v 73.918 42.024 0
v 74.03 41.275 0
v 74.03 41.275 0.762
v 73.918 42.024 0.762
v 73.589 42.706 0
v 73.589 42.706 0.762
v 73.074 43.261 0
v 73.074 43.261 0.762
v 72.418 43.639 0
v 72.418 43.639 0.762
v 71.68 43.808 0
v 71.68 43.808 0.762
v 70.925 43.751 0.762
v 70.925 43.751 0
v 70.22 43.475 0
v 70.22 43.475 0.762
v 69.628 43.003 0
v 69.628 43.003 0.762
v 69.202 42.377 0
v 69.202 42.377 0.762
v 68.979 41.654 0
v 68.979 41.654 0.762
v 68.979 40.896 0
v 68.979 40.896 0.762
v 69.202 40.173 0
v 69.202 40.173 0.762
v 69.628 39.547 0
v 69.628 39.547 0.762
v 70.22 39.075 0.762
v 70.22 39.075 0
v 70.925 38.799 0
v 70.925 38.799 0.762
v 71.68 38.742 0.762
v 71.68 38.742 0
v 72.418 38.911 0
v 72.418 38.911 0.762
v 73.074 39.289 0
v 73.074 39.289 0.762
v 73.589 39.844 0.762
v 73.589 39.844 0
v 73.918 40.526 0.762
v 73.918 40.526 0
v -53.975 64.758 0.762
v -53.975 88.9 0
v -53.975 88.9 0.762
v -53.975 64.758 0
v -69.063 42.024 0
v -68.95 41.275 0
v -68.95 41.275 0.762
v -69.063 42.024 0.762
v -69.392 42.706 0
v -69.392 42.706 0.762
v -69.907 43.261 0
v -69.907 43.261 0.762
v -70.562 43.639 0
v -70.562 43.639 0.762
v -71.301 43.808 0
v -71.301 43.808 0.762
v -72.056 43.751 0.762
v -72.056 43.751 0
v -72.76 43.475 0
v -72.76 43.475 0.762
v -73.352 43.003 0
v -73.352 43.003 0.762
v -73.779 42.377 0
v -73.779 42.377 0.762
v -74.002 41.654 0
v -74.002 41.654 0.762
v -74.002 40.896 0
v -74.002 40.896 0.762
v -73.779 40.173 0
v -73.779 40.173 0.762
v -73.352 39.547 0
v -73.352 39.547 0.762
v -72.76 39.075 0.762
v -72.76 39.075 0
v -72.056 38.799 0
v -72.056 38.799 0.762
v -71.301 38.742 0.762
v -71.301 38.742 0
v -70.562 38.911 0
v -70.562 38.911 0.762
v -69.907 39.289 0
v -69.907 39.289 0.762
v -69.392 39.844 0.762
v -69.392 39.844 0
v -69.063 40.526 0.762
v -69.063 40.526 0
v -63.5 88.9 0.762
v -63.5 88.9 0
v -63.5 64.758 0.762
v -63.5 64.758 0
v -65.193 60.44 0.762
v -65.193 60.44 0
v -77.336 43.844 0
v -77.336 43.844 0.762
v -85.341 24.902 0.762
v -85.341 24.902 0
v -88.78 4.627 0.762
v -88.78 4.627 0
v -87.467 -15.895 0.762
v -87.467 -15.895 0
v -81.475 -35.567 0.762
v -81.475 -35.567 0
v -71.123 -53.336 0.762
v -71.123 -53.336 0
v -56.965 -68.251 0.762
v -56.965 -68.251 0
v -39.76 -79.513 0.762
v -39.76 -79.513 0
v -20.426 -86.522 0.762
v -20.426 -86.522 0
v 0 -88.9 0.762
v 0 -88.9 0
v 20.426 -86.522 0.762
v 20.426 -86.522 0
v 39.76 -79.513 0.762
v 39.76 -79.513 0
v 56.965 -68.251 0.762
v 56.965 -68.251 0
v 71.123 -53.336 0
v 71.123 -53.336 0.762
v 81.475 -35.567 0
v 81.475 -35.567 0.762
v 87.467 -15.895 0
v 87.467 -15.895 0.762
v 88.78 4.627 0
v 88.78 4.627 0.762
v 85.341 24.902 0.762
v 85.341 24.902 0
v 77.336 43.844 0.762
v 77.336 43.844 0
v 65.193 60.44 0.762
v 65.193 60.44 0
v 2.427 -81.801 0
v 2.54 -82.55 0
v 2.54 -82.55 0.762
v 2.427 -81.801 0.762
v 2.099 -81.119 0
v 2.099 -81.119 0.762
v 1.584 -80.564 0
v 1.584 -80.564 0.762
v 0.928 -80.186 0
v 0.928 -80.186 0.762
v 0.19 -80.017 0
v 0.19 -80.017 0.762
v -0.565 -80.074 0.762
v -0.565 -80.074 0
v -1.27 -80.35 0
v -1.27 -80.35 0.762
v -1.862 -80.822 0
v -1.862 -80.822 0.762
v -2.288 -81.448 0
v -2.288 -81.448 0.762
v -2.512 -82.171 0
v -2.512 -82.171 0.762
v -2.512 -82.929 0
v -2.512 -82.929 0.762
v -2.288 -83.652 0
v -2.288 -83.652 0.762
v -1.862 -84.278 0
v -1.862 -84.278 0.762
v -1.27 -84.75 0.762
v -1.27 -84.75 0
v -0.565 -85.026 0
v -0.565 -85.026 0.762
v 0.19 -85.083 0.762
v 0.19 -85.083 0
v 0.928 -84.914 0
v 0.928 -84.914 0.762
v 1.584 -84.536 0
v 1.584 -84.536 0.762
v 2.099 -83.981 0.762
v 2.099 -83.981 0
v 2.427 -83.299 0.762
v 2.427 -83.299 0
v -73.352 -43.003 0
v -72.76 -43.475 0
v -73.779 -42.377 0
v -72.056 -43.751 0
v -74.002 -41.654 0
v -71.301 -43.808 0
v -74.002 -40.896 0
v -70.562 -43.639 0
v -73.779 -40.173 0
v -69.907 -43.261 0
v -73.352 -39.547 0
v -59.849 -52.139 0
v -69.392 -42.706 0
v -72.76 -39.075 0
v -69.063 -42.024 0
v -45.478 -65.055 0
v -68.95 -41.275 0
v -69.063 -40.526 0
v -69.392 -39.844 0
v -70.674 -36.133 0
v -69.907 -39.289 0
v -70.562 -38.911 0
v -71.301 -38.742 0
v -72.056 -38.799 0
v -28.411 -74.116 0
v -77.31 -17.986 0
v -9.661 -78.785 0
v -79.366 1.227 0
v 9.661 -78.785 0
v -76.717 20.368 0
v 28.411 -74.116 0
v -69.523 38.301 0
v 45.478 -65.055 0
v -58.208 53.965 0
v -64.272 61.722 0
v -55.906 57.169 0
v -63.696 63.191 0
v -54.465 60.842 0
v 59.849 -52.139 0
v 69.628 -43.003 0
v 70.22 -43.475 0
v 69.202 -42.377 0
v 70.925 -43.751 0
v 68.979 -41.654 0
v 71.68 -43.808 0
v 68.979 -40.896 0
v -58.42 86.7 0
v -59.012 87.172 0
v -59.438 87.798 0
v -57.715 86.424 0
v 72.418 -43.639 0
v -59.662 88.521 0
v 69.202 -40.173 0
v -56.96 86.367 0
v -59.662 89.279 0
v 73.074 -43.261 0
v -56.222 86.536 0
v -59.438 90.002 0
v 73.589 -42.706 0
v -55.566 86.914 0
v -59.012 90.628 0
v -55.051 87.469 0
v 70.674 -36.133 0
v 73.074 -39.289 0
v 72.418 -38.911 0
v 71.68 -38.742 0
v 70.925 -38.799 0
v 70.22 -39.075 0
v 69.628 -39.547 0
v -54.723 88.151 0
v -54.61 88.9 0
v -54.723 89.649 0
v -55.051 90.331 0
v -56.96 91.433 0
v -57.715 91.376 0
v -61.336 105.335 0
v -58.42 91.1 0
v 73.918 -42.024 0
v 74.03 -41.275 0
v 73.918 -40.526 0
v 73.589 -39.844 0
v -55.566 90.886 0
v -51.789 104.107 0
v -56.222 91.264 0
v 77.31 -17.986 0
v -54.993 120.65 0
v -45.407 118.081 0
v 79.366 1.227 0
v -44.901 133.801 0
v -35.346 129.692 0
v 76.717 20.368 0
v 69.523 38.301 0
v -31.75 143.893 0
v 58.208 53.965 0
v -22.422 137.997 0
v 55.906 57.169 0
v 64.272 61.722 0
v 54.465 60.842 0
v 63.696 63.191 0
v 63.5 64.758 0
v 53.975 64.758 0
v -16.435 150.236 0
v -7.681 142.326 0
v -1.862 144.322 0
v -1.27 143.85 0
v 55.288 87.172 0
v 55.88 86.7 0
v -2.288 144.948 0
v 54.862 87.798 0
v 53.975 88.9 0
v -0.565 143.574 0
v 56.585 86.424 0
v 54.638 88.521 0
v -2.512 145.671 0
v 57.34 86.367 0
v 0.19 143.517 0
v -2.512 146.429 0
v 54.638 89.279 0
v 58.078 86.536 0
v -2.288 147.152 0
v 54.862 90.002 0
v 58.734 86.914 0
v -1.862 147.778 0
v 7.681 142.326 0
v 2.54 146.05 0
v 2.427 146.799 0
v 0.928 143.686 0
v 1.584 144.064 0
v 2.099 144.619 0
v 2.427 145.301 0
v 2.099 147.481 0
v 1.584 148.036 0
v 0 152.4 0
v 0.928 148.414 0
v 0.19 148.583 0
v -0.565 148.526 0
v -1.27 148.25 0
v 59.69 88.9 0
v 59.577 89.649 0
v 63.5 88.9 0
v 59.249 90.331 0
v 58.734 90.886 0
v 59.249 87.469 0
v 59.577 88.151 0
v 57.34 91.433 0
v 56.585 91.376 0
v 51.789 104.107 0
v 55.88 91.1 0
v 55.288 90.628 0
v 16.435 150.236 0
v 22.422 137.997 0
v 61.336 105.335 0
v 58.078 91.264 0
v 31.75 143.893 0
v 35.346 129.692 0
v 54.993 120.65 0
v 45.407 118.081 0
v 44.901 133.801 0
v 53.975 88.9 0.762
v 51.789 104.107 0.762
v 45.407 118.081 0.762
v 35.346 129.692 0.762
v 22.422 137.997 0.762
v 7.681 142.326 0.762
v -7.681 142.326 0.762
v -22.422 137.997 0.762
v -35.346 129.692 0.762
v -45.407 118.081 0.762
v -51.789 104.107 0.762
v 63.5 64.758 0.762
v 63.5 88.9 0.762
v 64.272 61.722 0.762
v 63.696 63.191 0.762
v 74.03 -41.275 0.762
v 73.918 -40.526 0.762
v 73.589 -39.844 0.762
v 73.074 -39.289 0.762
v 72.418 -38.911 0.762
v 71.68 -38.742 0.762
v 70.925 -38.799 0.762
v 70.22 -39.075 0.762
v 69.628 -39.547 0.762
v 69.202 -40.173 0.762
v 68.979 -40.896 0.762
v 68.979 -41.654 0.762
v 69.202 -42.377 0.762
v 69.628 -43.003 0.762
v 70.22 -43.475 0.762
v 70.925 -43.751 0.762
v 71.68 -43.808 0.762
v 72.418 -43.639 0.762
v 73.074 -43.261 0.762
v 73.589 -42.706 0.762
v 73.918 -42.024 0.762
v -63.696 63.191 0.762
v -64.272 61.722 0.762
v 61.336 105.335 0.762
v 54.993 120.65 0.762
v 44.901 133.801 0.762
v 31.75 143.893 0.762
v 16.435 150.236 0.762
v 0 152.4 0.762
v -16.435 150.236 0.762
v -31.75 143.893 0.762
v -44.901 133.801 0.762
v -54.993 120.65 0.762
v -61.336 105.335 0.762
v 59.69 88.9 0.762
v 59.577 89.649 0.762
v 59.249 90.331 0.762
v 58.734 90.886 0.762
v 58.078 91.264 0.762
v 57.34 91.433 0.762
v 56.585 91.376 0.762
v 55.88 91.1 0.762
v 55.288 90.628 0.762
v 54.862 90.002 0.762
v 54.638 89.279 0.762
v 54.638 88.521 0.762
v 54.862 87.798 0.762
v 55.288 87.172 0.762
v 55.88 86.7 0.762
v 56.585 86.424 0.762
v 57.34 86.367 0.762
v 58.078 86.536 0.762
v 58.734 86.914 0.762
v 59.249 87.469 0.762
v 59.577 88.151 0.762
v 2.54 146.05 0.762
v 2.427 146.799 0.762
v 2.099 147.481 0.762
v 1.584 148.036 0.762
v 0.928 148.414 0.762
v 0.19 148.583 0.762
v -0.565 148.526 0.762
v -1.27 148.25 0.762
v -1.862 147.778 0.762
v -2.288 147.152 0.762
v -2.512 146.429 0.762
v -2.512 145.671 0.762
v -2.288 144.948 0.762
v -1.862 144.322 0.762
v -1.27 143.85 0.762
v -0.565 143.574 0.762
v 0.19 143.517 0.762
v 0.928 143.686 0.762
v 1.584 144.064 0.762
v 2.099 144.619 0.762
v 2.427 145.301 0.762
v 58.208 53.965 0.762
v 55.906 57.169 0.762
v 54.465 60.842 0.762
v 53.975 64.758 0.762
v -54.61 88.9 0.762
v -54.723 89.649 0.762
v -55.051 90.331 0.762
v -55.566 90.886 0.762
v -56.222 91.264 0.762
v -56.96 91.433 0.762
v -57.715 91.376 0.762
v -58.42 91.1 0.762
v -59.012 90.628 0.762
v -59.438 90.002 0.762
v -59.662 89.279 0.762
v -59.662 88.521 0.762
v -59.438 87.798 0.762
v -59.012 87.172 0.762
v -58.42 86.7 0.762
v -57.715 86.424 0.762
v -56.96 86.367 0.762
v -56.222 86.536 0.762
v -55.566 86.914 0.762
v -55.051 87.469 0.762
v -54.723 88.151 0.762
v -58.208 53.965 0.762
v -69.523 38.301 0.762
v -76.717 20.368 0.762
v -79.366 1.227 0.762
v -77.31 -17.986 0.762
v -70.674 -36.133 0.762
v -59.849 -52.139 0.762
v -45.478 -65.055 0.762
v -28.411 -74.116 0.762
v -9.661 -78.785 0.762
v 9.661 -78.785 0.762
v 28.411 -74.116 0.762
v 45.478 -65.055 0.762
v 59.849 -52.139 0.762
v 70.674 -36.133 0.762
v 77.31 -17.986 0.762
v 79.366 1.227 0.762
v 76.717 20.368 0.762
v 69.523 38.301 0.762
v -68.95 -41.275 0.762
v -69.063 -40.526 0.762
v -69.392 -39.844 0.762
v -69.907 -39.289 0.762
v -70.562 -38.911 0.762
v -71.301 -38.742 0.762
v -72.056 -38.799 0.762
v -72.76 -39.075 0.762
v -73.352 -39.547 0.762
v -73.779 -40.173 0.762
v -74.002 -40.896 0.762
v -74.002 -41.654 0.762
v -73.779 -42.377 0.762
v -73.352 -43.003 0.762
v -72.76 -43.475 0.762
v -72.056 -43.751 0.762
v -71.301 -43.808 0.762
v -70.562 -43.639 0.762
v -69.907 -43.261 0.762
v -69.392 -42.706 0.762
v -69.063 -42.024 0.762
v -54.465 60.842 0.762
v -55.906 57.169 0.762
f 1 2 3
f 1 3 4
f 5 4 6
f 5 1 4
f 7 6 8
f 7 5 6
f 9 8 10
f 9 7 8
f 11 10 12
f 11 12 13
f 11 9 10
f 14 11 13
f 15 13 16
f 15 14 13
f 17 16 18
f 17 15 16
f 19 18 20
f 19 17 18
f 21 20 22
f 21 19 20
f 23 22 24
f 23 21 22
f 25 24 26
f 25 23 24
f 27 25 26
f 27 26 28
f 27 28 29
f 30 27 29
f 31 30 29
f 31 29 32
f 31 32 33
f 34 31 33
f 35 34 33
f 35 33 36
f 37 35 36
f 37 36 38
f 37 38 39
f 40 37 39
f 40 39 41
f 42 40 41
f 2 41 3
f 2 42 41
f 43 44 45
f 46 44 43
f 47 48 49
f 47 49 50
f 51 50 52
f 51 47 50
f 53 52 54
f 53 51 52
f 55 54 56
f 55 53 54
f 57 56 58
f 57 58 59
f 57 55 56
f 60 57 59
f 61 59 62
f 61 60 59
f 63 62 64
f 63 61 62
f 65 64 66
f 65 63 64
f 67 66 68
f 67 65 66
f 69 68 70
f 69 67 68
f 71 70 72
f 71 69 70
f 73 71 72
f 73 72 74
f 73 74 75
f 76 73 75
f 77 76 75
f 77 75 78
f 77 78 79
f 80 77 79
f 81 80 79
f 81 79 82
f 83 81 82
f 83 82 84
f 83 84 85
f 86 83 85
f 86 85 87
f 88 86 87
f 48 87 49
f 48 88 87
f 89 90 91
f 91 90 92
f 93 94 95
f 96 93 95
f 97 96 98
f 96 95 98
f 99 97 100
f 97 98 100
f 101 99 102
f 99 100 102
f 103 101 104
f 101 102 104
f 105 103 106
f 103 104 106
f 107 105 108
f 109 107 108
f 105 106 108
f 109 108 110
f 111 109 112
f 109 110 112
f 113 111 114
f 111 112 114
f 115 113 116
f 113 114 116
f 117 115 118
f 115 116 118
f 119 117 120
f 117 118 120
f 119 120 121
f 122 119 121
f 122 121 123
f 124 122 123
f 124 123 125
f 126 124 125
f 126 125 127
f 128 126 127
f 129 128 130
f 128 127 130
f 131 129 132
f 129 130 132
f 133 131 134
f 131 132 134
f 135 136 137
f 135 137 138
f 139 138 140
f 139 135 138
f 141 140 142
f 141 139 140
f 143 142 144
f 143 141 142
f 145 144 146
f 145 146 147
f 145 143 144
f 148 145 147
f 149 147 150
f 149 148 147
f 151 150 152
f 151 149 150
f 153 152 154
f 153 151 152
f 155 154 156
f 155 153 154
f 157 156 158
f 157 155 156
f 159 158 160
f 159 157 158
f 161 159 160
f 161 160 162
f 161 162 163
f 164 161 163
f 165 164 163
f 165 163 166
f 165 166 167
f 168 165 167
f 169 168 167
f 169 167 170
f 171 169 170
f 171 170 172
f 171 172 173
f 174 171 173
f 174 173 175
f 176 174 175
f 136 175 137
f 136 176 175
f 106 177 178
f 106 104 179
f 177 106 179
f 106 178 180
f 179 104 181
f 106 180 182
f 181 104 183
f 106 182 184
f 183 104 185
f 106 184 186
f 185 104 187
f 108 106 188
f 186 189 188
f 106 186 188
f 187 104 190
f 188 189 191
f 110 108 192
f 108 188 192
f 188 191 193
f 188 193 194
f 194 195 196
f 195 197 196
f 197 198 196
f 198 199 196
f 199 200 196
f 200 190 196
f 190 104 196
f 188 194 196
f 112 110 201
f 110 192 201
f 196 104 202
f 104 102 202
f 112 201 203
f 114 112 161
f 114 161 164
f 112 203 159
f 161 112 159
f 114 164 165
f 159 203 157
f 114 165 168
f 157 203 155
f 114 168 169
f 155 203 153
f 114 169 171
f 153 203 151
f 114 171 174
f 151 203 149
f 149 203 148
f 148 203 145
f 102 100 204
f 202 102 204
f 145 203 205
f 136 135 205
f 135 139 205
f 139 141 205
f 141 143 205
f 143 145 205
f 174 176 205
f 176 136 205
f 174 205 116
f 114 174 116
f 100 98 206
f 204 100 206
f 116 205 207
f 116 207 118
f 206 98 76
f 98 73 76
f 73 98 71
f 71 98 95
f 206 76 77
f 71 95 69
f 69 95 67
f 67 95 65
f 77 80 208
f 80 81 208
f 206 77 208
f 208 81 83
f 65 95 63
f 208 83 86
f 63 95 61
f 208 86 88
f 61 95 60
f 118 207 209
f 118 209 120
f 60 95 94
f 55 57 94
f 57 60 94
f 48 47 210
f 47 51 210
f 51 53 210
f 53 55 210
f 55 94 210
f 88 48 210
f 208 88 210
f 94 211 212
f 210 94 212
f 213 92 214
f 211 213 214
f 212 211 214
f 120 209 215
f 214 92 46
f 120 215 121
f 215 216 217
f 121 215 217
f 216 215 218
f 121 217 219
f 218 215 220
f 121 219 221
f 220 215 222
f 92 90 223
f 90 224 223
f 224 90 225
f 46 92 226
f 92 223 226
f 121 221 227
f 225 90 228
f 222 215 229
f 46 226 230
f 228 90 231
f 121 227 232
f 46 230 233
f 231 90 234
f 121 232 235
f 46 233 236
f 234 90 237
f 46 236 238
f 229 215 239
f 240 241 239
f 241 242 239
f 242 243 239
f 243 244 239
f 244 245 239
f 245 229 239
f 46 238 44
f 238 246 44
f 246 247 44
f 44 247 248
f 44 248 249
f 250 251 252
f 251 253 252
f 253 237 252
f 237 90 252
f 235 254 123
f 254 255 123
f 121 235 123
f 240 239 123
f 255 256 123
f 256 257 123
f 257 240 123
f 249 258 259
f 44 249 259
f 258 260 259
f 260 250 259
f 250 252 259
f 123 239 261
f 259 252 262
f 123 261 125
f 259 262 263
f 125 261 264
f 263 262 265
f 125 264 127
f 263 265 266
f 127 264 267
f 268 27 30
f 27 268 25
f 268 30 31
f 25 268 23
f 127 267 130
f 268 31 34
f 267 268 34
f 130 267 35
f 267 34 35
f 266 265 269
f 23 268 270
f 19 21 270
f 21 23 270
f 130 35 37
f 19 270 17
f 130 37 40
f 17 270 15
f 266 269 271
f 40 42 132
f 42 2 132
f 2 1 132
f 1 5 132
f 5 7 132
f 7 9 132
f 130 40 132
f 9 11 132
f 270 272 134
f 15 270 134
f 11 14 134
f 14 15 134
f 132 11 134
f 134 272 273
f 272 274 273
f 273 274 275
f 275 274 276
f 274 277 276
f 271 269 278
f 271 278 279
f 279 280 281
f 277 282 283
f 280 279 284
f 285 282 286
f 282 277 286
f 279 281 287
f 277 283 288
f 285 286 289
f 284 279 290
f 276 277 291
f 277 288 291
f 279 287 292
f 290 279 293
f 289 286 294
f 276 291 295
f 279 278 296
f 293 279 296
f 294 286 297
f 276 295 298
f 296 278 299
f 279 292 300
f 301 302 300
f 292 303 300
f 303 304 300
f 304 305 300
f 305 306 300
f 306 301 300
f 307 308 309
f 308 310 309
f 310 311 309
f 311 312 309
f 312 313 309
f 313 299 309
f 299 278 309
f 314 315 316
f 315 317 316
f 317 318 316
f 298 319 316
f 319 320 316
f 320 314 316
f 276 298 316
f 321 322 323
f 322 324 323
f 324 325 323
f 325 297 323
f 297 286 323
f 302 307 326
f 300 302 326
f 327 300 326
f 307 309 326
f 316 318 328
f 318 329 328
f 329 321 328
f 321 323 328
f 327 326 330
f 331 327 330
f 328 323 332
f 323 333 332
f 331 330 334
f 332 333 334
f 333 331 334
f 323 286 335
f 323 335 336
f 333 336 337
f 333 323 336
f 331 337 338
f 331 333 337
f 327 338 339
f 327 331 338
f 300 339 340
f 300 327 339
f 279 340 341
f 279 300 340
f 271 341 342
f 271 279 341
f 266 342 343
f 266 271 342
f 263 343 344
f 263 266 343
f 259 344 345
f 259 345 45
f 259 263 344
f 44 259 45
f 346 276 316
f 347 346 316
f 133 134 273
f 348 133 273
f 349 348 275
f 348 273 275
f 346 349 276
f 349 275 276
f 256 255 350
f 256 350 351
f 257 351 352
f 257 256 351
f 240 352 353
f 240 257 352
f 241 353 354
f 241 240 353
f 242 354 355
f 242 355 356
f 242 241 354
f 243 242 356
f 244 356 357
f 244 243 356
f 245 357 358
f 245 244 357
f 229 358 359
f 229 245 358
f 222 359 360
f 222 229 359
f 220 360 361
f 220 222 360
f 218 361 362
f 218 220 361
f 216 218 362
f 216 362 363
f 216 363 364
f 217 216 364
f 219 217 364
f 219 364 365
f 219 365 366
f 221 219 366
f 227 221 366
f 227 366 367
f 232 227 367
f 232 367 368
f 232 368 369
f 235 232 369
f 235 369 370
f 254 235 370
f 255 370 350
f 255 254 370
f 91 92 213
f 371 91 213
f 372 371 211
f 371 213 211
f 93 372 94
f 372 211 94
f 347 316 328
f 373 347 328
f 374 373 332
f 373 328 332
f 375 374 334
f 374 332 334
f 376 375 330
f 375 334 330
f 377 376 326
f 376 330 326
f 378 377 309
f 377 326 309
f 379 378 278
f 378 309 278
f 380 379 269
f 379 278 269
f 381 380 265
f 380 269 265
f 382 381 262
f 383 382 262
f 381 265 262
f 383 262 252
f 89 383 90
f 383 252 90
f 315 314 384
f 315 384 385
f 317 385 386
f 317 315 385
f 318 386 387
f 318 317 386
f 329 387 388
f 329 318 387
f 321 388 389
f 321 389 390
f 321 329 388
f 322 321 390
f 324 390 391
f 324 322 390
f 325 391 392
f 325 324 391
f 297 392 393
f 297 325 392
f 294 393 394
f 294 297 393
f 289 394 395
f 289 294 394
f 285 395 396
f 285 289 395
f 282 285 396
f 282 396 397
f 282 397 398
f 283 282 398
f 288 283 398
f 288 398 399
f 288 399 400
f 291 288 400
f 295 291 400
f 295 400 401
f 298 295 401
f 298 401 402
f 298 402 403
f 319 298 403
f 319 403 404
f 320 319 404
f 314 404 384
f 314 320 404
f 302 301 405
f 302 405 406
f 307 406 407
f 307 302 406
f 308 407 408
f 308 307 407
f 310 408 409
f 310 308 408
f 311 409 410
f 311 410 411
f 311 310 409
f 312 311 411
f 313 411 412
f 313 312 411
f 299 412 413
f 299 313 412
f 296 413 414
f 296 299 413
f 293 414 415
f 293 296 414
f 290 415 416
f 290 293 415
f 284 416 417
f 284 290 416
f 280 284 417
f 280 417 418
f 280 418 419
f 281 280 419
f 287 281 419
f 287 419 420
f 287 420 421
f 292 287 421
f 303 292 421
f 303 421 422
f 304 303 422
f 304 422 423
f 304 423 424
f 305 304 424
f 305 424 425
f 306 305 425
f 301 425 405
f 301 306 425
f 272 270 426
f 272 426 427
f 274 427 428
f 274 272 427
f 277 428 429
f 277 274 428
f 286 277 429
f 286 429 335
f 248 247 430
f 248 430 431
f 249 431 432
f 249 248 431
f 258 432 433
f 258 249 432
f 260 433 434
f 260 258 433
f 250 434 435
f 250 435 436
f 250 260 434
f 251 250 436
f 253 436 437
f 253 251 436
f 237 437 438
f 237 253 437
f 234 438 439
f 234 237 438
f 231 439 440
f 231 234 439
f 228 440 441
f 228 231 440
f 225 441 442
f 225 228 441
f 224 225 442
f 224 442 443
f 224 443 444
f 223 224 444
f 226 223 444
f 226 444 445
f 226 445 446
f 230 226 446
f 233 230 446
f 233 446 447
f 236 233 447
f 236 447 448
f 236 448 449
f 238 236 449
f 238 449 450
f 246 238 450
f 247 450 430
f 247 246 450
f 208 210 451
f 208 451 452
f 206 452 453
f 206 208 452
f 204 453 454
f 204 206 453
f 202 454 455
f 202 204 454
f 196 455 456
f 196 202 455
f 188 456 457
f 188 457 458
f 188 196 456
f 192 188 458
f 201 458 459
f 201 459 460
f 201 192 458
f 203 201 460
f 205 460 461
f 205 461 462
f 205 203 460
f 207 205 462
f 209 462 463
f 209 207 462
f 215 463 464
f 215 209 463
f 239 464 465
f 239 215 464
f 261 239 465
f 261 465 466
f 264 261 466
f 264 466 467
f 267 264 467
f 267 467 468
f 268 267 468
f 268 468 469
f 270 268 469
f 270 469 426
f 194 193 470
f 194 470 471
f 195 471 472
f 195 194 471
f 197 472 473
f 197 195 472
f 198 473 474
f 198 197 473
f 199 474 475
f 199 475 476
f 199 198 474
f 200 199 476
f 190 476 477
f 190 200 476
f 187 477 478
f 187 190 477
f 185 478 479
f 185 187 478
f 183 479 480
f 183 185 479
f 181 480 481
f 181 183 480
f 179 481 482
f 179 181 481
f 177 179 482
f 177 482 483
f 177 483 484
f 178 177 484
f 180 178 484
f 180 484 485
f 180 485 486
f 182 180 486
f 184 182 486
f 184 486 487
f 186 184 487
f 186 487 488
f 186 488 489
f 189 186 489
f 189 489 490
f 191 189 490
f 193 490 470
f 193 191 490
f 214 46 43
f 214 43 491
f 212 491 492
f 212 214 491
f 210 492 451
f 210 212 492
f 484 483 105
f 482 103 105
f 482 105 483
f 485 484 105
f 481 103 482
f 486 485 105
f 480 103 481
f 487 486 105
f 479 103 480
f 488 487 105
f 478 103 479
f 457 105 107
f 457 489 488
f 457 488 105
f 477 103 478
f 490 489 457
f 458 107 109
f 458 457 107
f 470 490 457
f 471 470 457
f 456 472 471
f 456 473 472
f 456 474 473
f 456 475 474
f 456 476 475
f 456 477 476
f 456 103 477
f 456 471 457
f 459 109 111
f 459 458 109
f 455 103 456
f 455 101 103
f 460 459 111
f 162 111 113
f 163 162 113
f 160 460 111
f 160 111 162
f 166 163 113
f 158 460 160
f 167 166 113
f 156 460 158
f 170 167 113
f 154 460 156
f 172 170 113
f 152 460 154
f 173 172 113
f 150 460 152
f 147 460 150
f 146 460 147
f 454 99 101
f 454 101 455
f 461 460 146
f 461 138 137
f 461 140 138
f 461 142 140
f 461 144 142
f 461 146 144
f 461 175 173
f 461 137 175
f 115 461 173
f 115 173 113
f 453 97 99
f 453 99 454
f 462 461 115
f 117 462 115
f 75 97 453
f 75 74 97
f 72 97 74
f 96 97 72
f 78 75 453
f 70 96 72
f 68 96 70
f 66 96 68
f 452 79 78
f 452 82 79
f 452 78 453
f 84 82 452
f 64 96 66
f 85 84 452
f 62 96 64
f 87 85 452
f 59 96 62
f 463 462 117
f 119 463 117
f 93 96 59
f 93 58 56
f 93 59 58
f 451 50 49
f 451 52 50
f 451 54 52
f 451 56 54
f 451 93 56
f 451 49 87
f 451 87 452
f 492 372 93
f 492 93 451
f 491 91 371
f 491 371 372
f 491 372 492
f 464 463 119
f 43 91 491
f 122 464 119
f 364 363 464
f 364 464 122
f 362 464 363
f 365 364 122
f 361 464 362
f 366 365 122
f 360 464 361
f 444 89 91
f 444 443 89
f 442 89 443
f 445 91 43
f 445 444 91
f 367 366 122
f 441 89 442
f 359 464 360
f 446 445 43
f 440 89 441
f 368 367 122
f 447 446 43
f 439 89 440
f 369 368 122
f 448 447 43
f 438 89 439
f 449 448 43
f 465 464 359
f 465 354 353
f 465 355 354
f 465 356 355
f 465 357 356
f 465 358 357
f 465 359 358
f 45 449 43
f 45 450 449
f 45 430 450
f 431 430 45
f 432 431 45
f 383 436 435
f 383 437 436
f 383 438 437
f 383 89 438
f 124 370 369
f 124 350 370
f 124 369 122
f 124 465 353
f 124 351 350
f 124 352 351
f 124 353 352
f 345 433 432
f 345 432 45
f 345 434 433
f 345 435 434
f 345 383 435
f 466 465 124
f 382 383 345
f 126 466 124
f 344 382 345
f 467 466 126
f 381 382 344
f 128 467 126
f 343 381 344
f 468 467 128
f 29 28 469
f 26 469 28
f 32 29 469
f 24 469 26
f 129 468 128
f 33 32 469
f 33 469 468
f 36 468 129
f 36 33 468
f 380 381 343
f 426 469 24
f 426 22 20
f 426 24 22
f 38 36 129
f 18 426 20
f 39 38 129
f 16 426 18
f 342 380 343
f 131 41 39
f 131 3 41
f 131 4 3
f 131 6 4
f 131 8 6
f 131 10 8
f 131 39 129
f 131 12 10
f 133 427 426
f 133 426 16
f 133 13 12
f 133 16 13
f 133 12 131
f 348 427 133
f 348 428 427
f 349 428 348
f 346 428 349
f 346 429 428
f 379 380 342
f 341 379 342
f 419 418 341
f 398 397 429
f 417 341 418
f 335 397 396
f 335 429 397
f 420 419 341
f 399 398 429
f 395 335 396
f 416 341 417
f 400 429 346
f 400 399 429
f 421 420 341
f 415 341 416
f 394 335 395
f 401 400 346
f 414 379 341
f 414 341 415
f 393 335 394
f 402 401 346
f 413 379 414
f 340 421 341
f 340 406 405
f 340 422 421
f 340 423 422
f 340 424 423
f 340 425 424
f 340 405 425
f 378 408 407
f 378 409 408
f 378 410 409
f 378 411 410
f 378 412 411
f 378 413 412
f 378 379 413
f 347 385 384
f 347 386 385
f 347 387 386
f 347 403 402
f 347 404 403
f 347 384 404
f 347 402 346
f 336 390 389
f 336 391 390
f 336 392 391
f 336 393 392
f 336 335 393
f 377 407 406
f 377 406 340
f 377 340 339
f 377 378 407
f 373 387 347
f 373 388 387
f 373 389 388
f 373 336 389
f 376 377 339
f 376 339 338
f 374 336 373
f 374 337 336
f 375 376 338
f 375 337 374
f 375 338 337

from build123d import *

# Parameters (mm, degrees)
SKETCH1_R           = 2.54
BOSS_EXTRUDE2_DEPTH = 0.762


with BuildPart() as part:
    # Sketch1 → Boss-Extrude2 (new body)
    with BuildSketch(Plane.XY):
        with BuildLine():
            Line((-63.5, 88.9), (-63.5, 64.757547823))
            ThreePointArc((-63.5, 64.757547823), (-63.938471715, 62.438855663), (-65.193333333, 60.440377968))
            ThreePointArc((-65.193333333, 60.440377968), (0, -88.9), (65.193333333, 60.440377968))
            ThreePointArc((65.193333333, 60.440377968), (63.938471715, 62.438855663), (63.5, 64.757547823))
            Line((63.5, 64.757547823), (63.5, 88.9))
            ThreePointArc((63.5, 88.9), (0, 152.4), (-63.5, 88.9))
        make_face()
        with Locations((-71.490397082, -41.275)):
            Circle(SKETCH1_R, mode=Mode.SUBTRACT)
        with Locations((-71.490397082, 41.275)):
            Circle(SKETCH1_R, mode=Mode.SUBTRACT)
        with Locations((-57.15, 88.9)):
            Circle(SKETCH1_R, mode=Mode.SUBTRACT)
        with Locations((0, 146.05)):
            Circle(SKETCH1_R, mode=Mode.SUBTRACT)
        with Locations((57.15, 88.9)):
            Circle(SKETCH1_R, mode=Mode.SUBTRACT)
        with Locations((71.490397082, 41.275)):
            Circle(SKETCH1_R, mode=Mode.SUBTRACT)
        with Locations((71.490397082, -41.275)):
            Circle(SKETCH1_R, mode=Mode.SUBTRACT)
        with Locations((0, -82.55)):
            Circle(SKETCH1_R, mode=Mode.SUBTRACT)
        with BuildLine():
            Line((-53.975, 88.9), (-53.975, 64.757547823))
            ThreePointArc((-53.975, 64.757547823), (-55.071179287, 58.960817422), (-58.208333333, 53.964623186))
            ThreePointArc((-58.208333333, 53.964623186), (0, -79.375), (58.208333333, 53.964623186))
            ThreePointArc((58.208333333, 53.964623186), (55.071179287, 58.960817422), (53.975, 64.757547823))
            Line((53.975, 64.757547823), (53.975, 88.9))
            ThreePointArc((53.975, 88.9), (0, 142.875), (-53.975, 88.9))
        make_face(mode=Mode.SUBTRACT)
    extrude(amount=BOSS_EXTRUDE2_DEPTH)


solid = part.part
